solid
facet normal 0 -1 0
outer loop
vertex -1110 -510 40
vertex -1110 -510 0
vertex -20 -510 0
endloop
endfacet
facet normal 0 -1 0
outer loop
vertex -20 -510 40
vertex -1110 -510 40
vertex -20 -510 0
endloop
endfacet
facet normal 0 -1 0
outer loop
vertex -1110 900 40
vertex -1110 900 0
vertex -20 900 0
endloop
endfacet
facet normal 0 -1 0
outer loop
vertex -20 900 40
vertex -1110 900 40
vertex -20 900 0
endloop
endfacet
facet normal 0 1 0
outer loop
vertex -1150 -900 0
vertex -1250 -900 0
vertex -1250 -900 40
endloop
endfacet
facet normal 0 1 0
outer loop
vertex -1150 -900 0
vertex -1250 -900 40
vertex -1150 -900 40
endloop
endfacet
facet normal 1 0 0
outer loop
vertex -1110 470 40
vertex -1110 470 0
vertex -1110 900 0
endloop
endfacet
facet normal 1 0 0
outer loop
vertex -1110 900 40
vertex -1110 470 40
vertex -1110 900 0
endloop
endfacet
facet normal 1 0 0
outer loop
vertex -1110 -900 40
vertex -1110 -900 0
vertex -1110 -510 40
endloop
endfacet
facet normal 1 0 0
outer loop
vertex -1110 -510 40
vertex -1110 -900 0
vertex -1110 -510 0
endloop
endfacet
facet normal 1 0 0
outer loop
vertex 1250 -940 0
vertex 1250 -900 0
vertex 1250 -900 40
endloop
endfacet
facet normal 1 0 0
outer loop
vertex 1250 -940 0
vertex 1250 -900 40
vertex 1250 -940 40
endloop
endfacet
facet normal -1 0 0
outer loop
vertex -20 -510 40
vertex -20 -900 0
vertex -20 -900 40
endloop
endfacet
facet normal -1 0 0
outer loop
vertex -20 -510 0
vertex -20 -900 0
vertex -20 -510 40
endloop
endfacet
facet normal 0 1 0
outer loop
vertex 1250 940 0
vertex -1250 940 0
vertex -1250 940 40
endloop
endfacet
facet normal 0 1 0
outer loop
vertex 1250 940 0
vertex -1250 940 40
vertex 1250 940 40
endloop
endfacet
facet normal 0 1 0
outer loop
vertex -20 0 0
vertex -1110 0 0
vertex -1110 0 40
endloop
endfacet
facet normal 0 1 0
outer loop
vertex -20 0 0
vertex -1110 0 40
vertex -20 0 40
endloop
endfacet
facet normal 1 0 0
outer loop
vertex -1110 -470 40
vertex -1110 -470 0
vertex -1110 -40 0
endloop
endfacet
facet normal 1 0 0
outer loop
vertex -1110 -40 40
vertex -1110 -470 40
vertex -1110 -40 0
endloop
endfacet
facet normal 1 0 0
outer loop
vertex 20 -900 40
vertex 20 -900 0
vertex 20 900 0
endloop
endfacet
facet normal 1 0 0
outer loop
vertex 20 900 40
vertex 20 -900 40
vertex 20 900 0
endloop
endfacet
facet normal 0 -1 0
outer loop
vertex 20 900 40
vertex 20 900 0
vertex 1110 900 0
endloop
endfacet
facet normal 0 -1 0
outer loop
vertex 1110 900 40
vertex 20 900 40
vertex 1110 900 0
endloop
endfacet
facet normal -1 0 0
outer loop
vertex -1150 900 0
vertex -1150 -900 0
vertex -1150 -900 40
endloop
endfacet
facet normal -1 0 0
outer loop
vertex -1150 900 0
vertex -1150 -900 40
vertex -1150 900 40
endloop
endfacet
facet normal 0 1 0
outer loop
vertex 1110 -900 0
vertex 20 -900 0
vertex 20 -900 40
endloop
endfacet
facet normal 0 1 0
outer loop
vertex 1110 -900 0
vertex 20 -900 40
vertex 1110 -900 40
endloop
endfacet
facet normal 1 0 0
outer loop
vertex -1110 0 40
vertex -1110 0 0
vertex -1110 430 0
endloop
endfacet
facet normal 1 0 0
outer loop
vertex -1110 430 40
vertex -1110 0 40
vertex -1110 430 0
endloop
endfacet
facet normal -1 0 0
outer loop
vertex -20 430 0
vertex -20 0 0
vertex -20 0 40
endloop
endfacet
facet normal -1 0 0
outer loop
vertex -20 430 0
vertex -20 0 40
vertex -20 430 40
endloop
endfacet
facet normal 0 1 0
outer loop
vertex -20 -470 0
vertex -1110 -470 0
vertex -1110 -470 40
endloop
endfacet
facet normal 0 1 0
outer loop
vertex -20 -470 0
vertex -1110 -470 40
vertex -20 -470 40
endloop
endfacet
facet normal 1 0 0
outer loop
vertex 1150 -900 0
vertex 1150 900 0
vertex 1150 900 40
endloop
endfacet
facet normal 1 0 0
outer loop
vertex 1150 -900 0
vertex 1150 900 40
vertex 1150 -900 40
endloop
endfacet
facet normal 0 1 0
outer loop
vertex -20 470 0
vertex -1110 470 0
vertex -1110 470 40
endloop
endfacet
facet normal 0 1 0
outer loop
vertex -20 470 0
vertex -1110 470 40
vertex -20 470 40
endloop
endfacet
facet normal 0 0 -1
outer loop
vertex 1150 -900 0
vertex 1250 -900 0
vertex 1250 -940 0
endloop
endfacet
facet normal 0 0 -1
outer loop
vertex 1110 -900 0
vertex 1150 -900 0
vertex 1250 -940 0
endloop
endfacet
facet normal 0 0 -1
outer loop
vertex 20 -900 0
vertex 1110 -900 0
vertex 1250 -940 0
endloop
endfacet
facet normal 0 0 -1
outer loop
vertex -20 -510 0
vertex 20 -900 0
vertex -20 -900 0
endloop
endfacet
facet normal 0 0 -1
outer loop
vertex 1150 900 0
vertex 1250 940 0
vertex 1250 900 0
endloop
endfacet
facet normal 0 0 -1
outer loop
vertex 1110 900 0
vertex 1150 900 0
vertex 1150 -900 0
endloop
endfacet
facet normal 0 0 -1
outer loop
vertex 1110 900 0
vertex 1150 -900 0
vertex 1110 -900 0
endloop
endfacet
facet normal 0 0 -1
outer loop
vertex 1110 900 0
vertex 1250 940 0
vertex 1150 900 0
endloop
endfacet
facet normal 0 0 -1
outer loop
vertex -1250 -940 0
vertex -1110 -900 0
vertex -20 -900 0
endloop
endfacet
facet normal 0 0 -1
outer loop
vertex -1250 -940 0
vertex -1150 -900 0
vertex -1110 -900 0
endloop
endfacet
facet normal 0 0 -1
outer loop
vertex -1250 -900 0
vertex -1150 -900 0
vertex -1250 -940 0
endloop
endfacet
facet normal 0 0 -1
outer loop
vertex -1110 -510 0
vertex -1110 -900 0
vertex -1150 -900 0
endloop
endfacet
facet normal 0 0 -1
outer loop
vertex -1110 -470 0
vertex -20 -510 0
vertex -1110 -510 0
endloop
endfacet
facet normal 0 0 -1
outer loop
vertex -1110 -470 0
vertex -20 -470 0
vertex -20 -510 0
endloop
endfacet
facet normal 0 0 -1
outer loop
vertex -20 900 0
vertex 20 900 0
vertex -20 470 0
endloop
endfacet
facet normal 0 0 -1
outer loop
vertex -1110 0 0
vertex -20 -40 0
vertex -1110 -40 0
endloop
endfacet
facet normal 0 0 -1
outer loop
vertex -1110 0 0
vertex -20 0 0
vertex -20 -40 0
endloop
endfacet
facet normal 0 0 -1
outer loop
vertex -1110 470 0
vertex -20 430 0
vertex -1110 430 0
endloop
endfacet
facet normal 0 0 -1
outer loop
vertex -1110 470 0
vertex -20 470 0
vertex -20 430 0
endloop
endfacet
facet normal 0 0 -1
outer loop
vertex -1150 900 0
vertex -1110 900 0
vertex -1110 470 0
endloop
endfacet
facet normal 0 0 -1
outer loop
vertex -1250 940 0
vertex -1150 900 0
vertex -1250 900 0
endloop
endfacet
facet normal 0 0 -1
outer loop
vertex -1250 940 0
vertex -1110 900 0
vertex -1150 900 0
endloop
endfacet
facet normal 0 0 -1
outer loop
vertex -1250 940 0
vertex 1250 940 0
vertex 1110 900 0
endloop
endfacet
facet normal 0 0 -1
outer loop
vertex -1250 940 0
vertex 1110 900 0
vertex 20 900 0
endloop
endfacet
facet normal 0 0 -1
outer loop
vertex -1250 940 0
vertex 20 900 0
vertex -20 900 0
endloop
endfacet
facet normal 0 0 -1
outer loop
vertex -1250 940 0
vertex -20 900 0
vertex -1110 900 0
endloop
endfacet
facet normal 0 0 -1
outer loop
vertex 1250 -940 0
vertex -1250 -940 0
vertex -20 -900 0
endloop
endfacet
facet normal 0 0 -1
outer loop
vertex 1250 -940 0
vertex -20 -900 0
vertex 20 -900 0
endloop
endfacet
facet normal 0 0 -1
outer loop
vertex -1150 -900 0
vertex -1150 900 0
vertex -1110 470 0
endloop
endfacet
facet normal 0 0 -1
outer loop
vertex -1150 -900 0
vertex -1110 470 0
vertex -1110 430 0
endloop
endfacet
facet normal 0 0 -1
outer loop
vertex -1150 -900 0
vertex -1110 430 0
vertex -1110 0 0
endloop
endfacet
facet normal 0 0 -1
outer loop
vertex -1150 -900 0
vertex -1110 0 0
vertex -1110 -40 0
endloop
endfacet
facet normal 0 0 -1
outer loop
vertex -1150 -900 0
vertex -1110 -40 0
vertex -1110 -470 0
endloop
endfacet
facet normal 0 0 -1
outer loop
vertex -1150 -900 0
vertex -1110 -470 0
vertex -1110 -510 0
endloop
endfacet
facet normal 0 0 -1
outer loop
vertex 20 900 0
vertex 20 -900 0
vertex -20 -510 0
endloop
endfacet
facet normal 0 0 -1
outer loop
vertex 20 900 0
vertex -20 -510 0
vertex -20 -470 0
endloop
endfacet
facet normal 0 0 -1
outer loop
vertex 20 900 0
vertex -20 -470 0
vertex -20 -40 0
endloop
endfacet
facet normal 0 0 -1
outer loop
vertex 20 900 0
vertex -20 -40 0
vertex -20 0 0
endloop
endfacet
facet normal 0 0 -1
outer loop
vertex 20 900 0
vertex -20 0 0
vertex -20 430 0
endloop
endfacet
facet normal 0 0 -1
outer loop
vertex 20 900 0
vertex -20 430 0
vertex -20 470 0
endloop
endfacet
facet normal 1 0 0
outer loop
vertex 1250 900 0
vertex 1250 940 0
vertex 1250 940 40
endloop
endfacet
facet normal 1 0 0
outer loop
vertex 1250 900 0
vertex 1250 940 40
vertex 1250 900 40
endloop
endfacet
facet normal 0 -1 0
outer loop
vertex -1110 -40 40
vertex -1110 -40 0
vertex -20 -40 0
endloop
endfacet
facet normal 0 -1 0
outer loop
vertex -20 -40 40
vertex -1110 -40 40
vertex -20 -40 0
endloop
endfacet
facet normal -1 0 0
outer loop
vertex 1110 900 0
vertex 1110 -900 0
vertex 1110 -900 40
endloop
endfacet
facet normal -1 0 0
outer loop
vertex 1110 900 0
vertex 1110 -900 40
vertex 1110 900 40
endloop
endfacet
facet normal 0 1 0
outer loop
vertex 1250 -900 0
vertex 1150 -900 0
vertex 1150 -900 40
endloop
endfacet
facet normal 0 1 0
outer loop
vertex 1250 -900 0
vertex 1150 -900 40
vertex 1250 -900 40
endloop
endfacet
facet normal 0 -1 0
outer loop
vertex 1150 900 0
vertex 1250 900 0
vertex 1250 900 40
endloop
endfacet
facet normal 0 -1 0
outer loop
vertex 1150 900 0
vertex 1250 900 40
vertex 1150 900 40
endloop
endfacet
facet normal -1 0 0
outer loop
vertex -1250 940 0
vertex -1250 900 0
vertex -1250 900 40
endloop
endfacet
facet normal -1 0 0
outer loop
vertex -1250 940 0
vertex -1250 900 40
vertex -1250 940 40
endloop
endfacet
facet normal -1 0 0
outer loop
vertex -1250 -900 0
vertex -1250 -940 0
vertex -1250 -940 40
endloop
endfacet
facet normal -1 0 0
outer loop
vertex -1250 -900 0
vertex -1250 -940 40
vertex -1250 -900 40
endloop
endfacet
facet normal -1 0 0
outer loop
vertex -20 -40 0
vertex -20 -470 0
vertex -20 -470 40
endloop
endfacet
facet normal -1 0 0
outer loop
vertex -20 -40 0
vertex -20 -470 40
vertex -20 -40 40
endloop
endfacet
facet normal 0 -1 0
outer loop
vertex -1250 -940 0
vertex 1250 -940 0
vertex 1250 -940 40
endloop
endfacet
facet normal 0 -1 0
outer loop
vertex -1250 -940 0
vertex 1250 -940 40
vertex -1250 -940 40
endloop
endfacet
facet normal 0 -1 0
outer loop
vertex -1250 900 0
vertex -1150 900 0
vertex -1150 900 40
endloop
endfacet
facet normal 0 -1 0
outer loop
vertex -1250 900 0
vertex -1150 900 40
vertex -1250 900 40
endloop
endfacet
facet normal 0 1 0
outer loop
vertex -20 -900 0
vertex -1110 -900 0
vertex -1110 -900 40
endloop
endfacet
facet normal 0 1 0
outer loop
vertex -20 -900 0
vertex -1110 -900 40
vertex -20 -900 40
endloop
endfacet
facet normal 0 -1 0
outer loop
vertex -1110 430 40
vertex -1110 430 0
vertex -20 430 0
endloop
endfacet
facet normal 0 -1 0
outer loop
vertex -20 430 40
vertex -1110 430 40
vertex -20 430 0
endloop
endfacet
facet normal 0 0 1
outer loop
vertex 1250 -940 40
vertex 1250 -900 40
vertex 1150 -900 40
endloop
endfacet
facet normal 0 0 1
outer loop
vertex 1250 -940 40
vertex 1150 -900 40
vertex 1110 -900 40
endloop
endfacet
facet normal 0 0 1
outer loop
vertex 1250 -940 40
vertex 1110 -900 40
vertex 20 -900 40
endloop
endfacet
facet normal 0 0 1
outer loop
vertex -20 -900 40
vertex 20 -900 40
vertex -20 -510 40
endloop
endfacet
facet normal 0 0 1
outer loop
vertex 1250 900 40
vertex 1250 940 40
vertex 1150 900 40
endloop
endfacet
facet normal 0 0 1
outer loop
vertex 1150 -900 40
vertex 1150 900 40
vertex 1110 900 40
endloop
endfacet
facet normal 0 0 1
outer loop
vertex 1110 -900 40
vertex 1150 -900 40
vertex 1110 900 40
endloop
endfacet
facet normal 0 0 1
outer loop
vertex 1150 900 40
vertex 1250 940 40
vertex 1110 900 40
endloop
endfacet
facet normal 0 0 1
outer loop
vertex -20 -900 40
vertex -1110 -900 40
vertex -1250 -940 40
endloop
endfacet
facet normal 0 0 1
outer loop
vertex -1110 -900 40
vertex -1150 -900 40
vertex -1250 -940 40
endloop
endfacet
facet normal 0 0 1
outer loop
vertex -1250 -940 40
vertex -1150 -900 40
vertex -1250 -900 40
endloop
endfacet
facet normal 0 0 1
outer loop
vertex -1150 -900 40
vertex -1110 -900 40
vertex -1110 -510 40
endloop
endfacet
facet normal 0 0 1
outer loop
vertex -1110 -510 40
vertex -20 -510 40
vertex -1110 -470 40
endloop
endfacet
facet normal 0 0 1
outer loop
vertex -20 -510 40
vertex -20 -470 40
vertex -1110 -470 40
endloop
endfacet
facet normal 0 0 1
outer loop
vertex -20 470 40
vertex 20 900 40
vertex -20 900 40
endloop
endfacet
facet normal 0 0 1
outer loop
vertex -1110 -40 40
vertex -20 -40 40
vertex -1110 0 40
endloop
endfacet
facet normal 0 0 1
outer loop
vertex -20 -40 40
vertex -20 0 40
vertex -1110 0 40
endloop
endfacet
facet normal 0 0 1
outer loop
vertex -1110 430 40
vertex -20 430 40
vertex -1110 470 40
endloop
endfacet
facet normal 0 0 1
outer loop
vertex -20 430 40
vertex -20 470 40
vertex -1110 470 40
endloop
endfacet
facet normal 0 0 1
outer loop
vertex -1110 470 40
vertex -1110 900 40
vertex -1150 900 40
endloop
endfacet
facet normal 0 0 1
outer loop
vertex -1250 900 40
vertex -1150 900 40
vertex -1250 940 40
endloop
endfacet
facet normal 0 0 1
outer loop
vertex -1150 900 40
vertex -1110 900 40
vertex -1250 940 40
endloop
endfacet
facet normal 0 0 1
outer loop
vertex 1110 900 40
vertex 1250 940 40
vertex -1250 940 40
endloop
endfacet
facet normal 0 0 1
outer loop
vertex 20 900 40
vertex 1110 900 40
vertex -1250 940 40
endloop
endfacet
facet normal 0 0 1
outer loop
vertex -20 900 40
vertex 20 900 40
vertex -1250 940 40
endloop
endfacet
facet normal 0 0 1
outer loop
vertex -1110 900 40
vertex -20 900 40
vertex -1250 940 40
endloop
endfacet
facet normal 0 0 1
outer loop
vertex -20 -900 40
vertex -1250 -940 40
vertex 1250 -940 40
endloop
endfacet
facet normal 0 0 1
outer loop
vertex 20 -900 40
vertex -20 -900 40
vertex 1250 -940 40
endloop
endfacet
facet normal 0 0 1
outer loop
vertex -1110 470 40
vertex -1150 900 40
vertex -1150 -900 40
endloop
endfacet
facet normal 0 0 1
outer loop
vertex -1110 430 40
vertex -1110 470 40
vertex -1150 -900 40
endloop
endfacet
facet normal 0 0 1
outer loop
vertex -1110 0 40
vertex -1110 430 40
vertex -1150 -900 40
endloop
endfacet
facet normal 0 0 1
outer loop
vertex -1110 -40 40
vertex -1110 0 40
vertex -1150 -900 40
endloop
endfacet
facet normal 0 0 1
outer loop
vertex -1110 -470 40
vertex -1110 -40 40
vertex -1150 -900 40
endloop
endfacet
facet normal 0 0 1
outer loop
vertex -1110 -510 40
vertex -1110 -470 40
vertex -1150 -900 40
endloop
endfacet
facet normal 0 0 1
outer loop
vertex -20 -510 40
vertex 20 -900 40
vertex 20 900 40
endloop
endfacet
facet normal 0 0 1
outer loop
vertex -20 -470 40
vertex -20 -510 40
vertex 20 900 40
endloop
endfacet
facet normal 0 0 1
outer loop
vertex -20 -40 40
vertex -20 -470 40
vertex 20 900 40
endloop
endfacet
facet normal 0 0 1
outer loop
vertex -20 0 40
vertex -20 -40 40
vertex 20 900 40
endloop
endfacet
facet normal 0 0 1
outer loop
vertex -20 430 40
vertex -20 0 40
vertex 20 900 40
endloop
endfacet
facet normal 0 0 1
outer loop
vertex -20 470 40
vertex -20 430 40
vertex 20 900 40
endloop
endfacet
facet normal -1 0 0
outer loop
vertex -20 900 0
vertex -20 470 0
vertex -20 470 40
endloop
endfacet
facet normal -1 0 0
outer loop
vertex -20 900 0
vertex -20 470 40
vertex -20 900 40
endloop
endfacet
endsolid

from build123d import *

# Parameters (mm, degrees)
SKETCH_W   = 1090
SKETCH_H   = 430
SKETCH_H_2 = 1800
SKETCH_H_3 = 390
PAD_DEPTH  = 40


with BuildPart() as part:
    # Sketch → Pad (new body)
    with BuildSketch(Plane.XY):
        Polygon((-1250, 940), (1250, 940), (1250, 900), (1150, 900), (1150, -900), (1250, -900), (1250, -940), (-1250, -940), (-1250, -900), (-1150, -900), (-1150, 900), (-1250, 900), align=None)
        with Locations((-565, 685)):
            Rectangle(SKETCH_W, SKETCH_H, mode=Mode.SUBTRACT)
        with Locations((565, 0)):
            Rectangle(SKETCH_W, SKETCH_H_2, mode=Mode.SUBTRACT)
        with Locations((-565, -705)):
            Rectangle(SKETCH_W, SKETCH_H_3, mode=Mode.SUBTRACT)
        with Locations((-565, 215)):
            Rectangle(SKETCH_W, SKETCH_H, mode=Mode.SUBTRACT)
        with Locations((-565, -255)):
            Rectangle(SKETCH_W, SKETCH_H, mode=Mode.SUBTRACT)
    extrude(amount=PAD_DEPTH)


solid = part.part
